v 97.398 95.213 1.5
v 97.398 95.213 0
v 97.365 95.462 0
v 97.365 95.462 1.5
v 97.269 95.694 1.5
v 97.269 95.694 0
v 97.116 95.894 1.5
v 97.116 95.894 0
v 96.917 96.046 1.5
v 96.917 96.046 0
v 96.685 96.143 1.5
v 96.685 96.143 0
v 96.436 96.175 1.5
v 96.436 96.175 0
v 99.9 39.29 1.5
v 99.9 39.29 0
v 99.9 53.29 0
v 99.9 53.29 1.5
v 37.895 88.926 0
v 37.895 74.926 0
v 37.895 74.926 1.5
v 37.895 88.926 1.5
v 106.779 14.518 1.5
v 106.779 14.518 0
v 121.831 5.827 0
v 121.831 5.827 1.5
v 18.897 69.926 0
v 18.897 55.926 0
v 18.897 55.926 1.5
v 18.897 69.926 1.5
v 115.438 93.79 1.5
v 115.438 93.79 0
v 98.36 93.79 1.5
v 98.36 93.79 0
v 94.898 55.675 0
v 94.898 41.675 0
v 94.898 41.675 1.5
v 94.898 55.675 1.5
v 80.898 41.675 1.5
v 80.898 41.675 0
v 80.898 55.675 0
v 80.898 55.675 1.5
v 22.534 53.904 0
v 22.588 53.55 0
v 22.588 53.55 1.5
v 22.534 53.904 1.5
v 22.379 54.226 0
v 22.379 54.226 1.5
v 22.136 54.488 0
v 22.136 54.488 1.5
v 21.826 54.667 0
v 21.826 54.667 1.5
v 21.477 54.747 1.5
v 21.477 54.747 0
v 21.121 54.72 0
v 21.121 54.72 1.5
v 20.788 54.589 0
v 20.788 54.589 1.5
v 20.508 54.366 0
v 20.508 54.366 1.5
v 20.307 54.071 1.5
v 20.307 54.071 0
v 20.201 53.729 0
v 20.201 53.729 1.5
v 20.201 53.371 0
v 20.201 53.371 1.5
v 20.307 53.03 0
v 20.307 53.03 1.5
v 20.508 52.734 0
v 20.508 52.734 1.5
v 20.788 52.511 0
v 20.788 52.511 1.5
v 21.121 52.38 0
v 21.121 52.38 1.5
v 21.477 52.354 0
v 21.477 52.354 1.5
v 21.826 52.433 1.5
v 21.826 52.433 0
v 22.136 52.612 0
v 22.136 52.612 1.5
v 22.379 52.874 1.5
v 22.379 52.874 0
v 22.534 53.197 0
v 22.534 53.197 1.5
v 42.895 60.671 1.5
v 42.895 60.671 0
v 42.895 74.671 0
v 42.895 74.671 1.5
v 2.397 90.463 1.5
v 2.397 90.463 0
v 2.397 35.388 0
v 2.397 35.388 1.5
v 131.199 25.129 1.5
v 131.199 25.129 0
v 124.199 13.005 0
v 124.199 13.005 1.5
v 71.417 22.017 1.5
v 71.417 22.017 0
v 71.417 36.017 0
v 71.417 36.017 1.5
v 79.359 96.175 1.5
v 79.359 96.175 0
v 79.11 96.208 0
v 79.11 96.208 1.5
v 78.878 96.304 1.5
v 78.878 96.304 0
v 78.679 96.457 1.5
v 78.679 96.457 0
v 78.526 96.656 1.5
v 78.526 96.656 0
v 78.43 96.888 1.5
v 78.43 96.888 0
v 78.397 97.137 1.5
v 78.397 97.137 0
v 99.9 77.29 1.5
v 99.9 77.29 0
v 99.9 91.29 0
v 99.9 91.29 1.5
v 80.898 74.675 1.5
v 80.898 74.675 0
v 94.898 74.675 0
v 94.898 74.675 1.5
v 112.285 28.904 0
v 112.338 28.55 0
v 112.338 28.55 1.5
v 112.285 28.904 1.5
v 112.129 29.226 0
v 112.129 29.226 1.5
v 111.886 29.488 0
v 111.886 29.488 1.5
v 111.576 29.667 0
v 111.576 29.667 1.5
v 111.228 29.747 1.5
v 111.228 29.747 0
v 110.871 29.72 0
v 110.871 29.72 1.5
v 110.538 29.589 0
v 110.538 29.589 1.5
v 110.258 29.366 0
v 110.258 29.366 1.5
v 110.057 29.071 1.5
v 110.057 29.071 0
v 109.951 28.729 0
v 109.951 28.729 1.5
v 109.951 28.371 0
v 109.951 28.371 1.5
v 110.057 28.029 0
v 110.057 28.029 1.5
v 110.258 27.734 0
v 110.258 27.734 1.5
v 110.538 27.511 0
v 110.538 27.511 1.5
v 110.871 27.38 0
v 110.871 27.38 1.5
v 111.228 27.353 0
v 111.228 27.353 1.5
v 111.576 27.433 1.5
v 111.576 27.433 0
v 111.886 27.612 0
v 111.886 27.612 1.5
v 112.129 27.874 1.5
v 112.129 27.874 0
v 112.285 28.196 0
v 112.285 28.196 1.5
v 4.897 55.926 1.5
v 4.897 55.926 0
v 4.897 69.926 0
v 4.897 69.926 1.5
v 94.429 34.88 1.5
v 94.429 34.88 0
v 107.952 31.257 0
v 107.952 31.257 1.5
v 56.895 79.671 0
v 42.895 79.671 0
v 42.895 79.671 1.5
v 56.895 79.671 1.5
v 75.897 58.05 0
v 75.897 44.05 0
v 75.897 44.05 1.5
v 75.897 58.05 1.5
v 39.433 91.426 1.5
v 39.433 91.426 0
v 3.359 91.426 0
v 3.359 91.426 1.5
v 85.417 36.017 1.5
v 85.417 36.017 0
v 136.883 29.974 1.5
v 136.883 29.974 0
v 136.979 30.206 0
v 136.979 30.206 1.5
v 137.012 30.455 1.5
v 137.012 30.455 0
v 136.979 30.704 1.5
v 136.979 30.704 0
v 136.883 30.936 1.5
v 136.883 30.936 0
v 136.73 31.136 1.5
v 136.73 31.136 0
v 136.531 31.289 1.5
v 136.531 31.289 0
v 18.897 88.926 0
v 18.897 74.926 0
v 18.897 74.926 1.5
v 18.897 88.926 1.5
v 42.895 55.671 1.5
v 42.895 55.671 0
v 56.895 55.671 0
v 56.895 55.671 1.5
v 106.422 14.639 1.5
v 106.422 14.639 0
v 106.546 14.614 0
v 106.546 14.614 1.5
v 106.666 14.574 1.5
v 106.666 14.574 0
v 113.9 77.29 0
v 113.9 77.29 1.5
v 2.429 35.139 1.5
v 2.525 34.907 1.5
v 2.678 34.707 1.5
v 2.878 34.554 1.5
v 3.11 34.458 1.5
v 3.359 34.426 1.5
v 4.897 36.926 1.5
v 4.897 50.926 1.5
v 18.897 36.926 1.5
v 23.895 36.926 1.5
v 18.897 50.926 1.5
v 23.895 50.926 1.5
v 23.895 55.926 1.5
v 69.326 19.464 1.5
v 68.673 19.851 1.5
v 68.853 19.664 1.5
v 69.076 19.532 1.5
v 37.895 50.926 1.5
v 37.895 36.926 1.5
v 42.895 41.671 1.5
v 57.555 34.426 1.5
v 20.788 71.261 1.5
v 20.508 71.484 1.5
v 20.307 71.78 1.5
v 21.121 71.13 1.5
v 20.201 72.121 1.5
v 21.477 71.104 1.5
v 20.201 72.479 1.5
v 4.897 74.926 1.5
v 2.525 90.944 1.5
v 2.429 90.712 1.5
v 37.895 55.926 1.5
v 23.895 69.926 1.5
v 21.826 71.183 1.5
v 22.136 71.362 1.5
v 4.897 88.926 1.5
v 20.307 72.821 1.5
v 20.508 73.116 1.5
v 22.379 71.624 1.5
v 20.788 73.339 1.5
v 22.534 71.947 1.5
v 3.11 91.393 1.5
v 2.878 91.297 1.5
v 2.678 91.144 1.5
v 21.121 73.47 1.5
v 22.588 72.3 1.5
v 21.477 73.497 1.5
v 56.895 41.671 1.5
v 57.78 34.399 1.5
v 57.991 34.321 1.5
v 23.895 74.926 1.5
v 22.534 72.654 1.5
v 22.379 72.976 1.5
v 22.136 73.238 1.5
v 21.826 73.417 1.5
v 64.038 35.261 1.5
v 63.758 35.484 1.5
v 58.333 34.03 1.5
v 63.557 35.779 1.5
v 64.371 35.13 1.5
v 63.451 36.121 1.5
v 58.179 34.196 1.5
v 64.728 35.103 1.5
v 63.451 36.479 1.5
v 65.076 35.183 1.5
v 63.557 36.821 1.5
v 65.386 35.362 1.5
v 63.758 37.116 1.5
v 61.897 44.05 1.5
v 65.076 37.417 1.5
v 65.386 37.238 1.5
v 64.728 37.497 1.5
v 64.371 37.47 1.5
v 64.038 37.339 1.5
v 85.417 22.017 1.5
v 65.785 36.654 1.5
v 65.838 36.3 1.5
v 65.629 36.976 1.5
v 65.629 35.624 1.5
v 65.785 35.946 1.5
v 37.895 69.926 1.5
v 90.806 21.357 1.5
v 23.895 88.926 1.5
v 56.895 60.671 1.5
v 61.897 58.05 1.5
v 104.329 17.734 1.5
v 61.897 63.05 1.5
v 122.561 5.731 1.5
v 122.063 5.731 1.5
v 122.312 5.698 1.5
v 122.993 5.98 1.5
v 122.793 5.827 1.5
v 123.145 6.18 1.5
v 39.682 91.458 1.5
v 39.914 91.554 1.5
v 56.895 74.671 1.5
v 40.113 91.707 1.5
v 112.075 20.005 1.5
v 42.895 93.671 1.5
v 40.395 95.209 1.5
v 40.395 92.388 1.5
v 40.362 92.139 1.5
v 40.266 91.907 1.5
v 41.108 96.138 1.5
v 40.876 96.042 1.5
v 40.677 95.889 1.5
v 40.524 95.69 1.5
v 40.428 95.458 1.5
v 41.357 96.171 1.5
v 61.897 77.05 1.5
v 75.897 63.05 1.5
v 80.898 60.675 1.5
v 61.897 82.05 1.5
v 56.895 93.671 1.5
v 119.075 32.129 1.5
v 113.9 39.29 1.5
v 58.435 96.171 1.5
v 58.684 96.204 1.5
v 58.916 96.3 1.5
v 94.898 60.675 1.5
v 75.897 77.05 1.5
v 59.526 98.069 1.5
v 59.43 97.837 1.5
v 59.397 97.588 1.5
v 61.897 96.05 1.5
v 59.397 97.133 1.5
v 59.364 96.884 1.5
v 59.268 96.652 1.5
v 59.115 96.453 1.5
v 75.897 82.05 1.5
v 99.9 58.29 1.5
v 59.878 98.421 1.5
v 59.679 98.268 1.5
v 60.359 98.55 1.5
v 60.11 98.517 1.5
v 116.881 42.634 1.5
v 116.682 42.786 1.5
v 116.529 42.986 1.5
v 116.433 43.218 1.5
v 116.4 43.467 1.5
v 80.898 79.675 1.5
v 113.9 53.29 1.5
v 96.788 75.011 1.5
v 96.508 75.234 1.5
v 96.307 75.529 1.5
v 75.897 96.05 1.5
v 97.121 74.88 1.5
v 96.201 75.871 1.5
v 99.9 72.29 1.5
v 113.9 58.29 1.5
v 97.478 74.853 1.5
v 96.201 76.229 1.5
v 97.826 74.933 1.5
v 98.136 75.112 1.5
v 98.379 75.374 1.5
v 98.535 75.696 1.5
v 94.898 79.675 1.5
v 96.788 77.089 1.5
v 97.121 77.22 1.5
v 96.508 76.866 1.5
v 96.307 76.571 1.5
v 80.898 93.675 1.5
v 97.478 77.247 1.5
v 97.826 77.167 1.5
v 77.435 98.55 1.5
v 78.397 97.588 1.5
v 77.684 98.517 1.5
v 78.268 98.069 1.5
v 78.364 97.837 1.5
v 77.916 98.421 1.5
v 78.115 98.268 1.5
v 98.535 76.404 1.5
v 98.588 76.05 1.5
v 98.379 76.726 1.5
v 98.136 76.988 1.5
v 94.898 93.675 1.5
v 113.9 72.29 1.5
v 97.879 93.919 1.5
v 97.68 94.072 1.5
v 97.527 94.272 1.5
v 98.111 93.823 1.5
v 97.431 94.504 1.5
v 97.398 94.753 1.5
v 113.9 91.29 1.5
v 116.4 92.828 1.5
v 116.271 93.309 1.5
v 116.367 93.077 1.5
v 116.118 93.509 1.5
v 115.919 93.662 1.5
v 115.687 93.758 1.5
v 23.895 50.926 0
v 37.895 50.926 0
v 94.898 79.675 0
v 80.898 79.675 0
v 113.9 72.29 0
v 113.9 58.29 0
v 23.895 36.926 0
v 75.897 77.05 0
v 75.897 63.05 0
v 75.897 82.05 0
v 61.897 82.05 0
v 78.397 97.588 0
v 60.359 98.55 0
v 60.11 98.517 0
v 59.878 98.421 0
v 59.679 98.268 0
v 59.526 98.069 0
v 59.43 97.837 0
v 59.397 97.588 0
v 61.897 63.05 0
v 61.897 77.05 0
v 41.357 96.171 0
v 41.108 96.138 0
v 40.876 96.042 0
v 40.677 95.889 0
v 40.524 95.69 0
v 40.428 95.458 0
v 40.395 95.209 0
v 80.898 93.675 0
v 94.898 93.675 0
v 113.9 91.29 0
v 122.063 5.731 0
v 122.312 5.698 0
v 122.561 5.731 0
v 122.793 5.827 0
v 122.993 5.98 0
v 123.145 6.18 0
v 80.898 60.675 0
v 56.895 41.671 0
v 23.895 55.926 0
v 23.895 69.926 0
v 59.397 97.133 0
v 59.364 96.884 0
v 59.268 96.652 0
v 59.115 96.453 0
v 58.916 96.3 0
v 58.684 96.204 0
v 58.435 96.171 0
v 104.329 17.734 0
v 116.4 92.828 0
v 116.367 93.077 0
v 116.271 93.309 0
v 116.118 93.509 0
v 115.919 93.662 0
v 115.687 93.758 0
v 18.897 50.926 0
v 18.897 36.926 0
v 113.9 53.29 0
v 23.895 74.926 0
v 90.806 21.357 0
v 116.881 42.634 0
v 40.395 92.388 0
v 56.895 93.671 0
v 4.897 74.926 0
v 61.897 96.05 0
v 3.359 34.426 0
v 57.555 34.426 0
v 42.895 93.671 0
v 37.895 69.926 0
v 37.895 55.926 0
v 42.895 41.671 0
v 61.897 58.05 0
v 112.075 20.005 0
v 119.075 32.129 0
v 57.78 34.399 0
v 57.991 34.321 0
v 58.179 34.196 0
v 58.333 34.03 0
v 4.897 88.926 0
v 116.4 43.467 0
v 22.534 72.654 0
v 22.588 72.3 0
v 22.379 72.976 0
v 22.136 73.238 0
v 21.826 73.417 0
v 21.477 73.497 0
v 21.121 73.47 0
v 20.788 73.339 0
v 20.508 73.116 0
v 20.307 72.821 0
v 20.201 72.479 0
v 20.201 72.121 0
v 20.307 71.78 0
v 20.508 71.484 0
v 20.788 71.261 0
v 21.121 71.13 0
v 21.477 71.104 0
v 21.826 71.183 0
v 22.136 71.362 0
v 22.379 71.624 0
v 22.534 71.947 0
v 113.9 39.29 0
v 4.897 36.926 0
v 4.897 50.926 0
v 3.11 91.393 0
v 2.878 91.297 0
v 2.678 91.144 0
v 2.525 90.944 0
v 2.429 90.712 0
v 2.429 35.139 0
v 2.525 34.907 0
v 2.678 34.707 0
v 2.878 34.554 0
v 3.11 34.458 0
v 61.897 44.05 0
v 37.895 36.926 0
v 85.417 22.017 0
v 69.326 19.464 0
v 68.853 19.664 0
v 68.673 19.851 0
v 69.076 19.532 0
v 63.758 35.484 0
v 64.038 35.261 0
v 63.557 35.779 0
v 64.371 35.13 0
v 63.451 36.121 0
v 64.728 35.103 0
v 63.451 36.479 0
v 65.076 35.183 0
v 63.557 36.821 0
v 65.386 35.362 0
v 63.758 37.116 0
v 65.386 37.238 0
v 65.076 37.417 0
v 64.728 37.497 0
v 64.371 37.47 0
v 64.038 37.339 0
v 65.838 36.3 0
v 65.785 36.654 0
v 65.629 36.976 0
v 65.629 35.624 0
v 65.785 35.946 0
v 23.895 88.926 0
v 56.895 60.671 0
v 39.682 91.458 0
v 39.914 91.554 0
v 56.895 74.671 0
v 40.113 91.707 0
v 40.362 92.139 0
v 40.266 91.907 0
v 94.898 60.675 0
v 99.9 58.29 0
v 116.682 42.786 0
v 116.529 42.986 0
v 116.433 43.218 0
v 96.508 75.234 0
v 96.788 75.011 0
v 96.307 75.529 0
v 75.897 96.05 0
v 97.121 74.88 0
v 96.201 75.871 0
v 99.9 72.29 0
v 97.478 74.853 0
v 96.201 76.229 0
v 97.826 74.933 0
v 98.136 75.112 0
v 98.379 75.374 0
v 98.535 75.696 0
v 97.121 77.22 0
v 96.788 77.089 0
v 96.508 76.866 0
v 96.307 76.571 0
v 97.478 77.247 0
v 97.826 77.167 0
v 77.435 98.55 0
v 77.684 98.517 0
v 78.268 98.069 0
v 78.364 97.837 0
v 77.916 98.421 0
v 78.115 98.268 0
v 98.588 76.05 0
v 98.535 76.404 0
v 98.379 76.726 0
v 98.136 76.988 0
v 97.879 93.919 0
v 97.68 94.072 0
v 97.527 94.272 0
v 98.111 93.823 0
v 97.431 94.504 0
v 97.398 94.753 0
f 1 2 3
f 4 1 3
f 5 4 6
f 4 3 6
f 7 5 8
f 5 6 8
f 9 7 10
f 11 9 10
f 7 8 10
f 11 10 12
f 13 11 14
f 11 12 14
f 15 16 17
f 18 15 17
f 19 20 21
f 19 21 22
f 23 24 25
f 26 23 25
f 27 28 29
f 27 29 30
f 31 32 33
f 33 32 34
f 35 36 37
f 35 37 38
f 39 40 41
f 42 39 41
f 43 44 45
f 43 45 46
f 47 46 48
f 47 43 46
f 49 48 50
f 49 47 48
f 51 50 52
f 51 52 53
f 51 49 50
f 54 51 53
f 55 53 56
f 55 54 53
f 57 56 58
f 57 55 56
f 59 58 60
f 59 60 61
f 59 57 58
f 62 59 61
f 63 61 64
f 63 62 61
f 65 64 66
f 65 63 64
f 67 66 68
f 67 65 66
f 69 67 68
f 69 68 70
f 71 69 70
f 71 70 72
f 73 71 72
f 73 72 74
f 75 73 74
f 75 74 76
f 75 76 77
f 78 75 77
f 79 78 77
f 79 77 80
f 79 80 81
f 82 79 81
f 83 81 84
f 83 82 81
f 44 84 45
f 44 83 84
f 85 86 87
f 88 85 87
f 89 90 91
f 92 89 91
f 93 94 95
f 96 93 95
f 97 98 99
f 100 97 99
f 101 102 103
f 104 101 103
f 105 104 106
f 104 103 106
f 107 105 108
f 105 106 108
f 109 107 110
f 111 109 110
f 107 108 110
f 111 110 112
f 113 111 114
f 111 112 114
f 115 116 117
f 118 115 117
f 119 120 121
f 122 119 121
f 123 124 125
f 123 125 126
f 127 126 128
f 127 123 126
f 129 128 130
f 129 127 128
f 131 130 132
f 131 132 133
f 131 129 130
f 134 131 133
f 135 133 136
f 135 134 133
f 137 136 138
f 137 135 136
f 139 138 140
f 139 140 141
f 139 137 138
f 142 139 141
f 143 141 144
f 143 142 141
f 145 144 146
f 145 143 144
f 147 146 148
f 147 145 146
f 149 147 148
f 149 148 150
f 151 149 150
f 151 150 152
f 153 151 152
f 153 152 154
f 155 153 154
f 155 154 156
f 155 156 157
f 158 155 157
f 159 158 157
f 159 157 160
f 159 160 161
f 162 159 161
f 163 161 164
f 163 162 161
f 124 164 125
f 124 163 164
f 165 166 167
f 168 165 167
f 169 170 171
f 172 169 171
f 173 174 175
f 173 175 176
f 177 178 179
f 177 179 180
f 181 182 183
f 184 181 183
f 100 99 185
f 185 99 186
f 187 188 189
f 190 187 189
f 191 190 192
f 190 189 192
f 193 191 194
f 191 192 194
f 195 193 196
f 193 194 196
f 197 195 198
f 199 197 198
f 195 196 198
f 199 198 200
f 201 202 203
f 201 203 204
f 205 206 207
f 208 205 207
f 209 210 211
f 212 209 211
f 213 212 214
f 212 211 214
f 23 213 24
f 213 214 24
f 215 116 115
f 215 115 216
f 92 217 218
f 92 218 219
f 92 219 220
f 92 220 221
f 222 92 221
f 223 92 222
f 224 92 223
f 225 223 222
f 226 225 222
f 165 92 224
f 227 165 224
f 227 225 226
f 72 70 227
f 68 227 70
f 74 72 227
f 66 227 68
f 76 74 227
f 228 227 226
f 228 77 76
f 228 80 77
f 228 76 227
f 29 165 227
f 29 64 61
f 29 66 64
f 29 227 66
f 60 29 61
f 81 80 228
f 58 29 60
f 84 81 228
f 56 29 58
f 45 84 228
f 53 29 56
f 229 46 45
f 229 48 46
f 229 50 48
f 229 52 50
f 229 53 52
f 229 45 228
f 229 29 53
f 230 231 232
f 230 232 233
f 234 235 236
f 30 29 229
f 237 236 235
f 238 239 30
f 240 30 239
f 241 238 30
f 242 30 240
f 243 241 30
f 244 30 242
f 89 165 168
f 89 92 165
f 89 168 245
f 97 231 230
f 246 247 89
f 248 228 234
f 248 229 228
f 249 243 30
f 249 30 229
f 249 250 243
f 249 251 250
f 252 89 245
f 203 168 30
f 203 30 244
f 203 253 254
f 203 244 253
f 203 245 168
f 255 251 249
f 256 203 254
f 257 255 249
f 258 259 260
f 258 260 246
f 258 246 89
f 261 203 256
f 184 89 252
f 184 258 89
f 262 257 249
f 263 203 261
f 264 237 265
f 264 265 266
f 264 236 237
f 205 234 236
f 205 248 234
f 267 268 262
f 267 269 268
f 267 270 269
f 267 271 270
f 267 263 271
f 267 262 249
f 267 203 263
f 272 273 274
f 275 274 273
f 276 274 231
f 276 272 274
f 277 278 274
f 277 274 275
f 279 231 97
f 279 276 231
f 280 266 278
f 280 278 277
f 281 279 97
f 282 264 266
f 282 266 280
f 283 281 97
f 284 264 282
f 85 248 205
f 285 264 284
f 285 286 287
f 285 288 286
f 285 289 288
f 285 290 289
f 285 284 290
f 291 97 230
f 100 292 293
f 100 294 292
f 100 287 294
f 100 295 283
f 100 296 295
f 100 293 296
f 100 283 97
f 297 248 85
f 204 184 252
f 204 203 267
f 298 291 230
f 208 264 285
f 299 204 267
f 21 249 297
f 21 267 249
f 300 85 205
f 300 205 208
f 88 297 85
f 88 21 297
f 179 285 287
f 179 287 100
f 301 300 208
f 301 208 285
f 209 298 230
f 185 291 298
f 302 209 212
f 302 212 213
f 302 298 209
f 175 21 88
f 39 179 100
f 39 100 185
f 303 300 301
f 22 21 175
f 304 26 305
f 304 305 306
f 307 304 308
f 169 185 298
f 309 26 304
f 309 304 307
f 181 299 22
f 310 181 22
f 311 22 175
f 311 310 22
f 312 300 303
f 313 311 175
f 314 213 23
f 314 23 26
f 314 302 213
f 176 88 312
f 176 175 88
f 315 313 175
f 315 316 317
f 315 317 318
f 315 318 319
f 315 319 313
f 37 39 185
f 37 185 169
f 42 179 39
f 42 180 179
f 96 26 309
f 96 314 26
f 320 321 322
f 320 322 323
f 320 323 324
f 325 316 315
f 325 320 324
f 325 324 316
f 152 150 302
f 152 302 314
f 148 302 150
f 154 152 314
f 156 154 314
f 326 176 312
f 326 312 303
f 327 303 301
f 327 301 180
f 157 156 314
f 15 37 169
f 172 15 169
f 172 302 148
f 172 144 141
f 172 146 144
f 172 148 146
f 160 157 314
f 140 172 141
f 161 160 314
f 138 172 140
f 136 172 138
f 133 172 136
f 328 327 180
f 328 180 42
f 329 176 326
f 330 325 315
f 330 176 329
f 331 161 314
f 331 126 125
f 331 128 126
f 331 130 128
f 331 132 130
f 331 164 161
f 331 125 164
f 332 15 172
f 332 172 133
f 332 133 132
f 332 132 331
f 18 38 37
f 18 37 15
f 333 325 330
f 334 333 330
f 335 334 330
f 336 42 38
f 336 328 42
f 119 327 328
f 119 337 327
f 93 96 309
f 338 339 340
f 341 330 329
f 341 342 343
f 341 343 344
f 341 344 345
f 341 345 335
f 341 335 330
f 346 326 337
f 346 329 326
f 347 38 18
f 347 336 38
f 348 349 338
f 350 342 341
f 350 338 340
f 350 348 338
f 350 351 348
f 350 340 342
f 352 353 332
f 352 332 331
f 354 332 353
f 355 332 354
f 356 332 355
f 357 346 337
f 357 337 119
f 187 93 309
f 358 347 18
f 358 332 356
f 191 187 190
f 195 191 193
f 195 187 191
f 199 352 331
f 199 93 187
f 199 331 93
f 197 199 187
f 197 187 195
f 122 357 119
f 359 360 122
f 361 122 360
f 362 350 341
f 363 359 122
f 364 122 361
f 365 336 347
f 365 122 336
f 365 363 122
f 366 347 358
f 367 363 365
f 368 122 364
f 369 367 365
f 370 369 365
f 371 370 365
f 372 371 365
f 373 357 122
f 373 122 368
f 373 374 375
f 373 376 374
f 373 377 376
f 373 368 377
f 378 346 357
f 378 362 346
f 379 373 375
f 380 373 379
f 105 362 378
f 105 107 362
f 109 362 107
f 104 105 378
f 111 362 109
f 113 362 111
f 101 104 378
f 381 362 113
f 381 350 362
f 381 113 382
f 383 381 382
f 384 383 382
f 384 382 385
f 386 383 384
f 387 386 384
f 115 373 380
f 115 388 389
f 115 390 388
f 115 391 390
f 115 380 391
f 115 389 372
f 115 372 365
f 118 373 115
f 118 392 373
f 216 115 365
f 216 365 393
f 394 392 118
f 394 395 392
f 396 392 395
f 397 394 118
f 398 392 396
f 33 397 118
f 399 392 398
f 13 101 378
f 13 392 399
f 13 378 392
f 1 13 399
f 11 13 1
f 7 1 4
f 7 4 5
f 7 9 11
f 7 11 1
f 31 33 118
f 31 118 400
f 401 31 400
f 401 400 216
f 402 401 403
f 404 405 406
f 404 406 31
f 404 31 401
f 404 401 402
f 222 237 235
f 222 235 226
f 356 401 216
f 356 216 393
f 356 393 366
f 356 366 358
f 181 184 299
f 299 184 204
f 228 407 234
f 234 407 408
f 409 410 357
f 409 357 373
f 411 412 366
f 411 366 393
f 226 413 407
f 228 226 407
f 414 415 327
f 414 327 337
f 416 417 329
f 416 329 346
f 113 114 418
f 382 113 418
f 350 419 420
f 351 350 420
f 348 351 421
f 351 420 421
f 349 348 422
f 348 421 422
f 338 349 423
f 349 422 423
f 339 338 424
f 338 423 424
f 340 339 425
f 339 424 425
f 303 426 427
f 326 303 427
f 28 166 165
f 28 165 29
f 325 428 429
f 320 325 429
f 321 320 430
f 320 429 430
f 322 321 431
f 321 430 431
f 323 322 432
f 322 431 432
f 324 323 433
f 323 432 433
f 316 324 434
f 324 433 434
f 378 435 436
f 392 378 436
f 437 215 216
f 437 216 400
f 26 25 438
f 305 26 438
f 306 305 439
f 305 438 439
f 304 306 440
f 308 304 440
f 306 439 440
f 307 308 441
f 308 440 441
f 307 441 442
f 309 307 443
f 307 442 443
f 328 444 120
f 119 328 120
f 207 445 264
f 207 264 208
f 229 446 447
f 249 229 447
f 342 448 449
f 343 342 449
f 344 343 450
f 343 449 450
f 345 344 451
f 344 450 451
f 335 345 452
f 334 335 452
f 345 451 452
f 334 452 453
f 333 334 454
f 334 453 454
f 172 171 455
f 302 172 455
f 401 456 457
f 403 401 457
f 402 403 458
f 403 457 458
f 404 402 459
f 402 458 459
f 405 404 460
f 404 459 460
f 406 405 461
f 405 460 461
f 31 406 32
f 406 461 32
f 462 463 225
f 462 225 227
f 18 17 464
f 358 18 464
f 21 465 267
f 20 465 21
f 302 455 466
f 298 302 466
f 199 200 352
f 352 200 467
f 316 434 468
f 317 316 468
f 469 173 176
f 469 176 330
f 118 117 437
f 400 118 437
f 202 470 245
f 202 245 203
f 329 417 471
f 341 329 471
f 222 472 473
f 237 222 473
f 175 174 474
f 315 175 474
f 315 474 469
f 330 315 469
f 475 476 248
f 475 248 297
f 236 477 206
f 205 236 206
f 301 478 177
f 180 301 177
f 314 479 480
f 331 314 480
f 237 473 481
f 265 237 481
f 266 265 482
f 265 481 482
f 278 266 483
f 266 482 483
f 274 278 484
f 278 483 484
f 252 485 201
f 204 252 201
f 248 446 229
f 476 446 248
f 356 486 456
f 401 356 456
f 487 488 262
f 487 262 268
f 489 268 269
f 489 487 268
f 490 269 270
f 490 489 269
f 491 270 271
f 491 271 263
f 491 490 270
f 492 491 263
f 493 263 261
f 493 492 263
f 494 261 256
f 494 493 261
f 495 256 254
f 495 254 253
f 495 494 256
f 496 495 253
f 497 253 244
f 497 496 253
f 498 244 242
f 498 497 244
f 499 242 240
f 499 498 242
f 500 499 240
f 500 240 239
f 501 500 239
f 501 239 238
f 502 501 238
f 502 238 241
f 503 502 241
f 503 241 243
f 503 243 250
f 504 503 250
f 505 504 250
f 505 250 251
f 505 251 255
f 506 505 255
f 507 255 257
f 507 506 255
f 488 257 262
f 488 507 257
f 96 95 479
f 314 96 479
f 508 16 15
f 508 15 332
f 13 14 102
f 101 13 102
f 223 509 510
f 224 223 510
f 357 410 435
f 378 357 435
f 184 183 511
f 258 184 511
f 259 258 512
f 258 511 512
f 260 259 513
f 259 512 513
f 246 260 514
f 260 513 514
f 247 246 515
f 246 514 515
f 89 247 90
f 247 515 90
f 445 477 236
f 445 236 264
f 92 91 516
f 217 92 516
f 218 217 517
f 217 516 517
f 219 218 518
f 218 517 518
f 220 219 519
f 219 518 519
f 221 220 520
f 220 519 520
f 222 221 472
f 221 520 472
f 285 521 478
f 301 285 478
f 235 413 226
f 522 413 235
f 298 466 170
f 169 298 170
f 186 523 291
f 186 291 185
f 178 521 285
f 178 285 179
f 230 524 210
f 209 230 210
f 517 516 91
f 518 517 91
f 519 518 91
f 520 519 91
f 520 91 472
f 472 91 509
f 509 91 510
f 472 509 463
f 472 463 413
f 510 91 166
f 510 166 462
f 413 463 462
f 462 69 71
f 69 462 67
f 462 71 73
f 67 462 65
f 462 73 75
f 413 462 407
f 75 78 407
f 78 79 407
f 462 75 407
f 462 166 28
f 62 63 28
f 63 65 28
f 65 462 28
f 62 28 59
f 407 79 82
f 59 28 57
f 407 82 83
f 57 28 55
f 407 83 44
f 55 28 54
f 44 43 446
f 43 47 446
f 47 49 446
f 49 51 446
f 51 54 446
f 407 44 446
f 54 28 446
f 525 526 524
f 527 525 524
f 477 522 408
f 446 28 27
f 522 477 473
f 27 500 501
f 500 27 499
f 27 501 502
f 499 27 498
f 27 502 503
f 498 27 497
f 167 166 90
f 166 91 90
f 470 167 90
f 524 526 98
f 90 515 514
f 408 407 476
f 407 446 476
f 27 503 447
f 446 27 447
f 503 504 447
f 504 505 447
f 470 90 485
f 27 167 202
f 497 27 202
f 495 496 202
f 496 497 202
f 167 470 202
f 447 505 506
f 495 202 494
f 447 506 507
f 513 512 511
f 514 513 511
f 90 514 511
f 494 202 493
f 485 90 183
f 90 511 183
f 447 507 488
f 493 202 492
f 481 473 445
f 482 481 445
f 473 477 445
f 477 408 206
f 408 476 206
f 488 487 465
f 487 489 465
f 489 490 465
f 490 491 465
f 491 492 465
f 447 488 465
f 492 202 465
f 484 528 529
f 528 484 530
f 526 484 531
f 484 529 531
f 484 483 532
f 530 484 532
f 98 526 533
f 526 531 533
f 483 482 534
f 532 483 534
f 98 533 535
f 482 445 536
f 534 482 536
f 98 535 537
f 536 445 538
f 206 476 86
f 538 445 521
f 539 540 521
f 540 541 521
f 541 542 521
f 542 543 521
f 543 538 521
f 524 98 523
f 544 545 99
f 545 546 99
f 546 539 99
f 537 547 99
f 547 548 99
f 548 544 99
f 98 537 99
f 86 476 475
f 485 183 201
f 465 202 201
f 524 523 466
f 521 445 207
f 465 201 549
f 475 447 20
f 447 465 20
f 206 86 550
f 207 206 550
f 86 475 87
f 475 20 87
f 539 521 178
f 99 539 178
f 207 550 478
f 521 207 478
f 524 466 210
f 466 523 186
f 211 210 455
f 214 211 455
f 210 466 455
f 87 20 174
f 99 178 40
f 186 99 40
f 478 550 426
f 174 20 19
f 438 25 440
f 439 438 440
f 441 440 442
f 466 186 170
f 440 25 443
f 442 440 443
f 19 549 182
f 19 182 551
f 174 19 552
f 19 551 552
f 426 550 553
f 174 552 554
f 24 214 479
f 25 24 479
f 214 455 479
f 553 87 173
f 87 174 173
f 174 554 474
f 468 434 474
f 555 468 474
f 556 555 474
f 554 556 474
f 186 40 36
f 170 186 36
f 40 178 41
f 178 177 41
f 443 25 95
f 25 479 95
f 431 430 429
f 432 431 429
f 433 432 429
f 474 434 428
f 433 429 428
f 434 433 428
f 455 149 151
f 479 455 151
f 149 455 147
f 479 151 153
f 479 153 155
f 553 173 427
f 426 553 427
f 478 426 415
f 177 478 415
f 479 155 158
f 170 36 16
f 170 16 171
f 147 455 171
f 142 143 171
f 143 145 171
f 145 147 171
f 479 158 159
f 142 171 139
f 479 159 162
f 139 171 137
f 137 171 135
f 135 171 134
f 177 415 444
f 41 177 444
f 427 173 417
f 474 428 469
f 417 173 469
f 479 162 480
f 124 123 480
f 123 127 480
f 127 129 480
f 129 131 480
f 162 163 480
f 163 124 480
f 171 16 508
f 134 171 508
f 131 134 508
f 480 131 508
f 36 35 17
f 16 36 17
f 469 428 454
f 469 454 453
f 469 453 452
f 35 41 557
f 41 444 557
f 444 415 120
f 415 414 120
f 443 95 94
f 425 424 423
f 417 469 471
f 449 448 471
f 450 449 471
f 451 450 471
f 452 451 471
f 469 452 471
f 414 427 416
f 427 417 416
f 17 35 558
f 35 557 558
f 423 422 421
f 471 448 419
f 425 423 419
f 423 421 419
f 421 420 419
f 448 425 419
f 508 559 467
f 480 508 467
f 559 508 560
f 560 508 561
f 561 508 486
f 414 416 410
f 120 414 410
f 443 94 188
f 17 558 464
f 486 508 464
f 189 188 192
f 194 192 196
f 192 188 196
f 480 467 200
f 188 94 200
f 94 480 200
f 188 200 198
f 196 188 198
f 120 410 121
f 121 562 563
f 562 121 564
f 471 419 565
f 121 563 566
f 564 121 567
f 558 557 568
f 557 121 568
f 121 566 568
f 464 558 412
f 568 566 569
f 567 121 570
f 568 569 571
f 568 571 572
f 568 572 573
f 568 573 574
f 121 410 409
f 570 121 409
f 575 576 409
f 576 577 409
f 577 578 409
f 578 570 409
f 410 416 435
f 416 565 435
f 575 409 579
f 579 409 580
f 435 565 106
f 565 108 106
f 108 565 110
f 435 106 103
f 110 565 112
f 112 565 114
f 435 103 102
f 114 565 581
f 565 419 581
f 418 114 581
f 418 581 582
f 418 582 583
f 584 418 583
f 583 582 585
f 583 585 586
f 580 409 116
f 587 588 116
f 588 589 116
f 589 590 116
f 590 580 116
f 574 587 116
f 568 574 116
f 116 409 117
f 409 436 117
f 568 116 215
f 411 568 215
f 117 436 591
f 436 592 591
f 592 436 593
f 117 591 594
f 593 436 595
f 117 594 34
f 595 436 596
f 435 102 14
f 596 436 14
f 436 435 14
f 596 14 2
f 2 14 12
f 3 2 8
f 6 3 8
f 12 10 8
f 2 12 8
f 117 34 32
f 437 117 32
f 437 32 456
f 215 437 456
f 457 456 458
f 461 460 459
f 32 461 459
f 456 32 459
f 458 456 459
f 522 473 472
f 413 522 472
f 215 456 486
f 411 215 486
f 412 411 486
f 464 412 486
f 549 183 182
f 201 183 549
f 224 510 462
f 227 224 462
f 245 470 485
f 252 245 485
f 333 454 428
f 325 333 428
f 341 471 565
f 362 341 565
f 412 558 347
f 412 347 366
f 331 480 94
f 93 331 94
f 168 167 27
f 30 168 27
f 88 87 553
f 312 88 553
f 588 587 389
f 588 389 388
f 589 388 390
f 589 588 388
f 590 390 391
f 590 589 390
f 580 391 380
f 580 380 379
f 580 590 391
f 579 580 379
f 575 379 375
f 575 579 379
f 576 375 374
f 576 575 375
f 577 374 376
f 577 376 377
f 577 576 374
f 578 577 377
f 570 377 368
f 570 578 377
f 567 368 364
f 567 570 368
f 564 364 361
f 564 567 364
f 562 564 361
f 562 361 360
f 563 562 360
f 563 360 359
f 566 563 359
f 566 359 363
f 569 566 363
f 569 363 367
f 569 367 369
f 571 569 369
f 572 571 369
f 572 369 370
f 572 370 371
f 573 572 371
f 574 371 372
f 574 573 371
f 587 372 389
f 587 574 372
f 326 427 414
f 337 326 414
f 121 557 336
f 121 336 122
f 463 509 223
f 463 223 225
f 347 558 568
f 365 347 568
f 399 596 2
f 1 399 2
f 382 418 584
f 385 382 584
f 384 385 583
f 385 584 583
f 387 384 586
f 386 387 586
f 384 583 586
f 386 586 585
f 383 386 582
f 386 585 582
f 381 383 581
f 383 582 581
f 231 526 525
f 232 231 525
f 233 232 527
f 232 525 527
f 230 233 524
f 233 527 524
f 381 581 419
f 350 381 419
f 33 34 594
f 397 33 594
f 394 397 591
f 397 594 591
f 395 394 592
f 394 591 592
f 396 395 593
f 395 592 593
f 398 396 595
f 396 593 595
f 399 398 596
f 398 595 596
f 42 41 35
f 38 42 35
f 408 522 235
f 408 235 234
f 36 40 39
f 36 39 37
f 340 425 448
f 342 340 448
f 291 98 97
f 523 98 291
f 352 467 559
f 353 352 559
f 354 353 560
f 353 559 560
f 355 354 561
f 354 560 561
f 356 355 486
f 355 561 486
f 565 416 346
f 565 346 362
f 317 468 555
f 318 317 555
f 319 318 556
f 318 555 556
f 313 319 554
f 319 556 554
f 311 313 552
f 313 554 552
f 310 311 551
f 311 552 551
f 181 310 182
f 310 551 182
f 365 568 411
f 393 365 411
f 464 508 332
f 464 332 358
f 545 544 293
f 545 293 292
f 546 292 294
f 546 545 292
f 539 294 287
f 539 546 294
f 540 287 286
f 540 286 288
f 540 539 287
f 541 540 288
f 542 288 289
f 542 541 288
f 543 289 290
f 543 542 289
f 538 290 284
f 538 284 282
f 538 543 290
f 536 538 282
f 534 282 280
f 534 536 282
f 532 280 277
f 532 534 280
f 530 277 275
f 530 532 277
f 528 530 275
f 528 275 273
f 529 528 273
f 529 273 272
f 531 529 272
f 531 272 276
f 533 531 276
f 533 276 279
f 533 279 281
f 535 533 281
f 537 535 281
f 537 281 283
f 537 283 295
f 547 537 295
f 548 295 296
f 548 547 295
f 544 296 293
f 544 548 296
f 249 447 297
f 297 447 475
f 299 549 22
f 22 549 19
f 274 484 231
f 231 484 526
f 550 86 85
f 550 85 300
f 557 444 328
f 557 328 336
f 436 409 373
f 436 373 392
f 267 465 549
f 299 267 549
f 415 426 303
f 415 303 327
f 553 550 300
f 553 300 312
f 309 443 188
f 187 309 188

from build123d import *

# Parameters (mm, degrees)
SKETCH2_W           = 13.999999997
SKETCH2_H           = 13.999999996
SKETCH2_W_2         = 13.999999996
SKETCH2_R           = 1.2
SKETCH2_H_2         = 13.999999997
BOSS_EXTRUDE1_DEPTH = 1.5


with BuildPart() as part:
    # Sketch2 → Boss-Extrude1 (new body)
    with BuildSketch(Plane.XY):
        with BuildLine():
            ThreePointArc((3.358715952, 91.42556159), (2.678391323, 91.143761902), (2.396591635, 90.463437274))
            Line((2.396591635, 90.463437274), (2.396591635, 35.387693174))
            ThreePointArc((2.396591635, 35.387693174), (2.678391323, 34.707368546), (3.358715952, 34.425568858))
            Line((3.358715952, 34.425568858), (57.55538108, 34.425568858))
            ThreePointArc((57.55538108, 34.425568858), (57.991412266, 34.32109249), (58.332746845, 34.030353412))
            Line((58.332746845, 34.030353412), (68.6731028, 19.851286658))
            ThreePointArc((68.6731028, 19.851286658), (68.959916761, 19.590522811), (69.326358752, 19.464109602))
            Line((69.326358752, 19.464109602), (106.42211034, 14.638604201))
            ThreePointArc((106.42211034, 14.638604201), (106.606561986, 14.595821202), (106.779062685, 14.517742374))
            Line((106.779062685, 14.517742374), (121.831200494, 5.827386558))
            ThreePointArc((121.831200494, 5.827386558), (122.561278749, 5.731269932), (123.145486752, 6.1795485))
            Line((123.145486752, 6.1795485), (136.883362434, 29.974247168))
            ThreePointArc((136.883362434, 29.974247168), (136.979479059, 30.704325424), (136.531200492, 31.288533426))
            Line((136.531200492, 31.288533426), (116.881014221, 42.63357376))
            ThreePointArc((116.881014221, 42.63357376), (116.52885228, 42.985735701), (116.399952063, 43.466797859))
            Line((116.399952063, 43.466797859), (116.399952063, 92.828345033))
            ThreePointArc((116.399952063, 92.828345033), (116.118152375, 93.508669661), (115.437827746, 93.790469349))
            Line((115.437827746, 93.790469349), (98.360317754, 93.790469349))
            ThreePointArc((98.360317754, 93.790469349), (97.679993126, 94.072269037), (97.398193438, 94.752593666))
            Line((97.398193438, 94.752593666), (97.398193438, 95.213192117))
            ThreePointArc((97.398193438, 95.213192117), (97.11639375, 95.893516746), (96.436069121, 96.175316434))
            Line((96.436069121, 96.175316434), (79.359092742, 96.175316434))
            ThreePointArc((79.359092742, 96.175316434), (78.678768113, 96.457116122), (78.396968425, 97.137440751))
            Line((78.396968425, 97.137440751), (78.396968425, 97.587767164))
            ThreePointArc((78.396968425, 97.587767164), (78.115168737, 98.268091793), (77.434844109, 98.54989148))
            Line((77.434844109, 98.54989148), (60.359092745, 98.54989148))
            ThreePointArc((60.359092745, 98.54989148), (59.678768117, 98.268091793), (59.396968429, 97.587767164))
            Line((59.396968429, 97.587767164), (59.396968429, 97.133171852))
            ThreePointArc((59.396968429, 97.133171852), (59.115168741, 96.452847223), (58.434844112, 96.171047535))
            Line((58.434844112, 96.171047535), (41.357156249, 96.171047535))
            ThreePointArc((41.357156249, 96.171047535), (40.676831621, 95.889247847), (40.395031933, 95.208923218))
            Line((40.395031933, 95.208923218), (40.395031933, 92.387685907))
            ThreePointArc((40.395031933, 92.387685907), (40.113232245, 91.707361278), (39.432907616, 91.42556159))
            Line((39.432907616, 91.42556159), (3.358715952, 91.42556159))
        make_face()
        with Locations((11.896591633, 43.925568856)):
            Rectangle(SKETCH2_W, SKETCH2_H, mode=Mode.SUBTRACT)
        with Locations((30.894762974, 43.926240308)):
            Rectangle(SKETCH2_W_2, SKETCH2_H, mode=Mode.SUBTRACT)
        with Locations((64.637863533, 36.300090173)):
            Circle(SKETCH2_R, mode=Mode.SUBTRACT)
        with Locations((49.895031931, 48.671054801)):
            Rectangle(SKETCH2_W_2, SKETCH2_H_2, mode=Mode.SUBTRACT)
        with Locations((68.896968427, 51.049898746)):
            Rectangle(SKETCH2_W_2, SKETCH2_H, mode=Mode.SUBTRACT)
        Polygon((94.429437772, 34.880450616), (107.952399337, 31.256983985), (104.328932707, 17.734022421), (90.805971142, 21.357489051), align=None, mode=Mode.SUBTRACT)
        with Locations((111.137845658, 28.550051811)):
            Circle(SKETCH2_R, mode=Mode.SUBTRACT)
        Polygon((124.199361084, 13.004912388), (112.075005434, 20.004912386), (119.075005433, 32.129268036), (131.199361083, 25.129268038), align=None, mode=Mode.SUBTRACT)
        with Locations((78.416585941, 29.017413842)):
            Rectangle(SKETCH2_W_2, SKETCH2_H, mode=Mode.SUBTRACT)
        with Locations((87.89819344, 48.6753237)):
            Rectangle(SKETCH2_W, SKETCH2_H_2, mode=Mode.SUBTRACT)
        with Locations((106.899952065, 46.290476615)):
            Rectangle(SKETCH2_W, SKETCH2_H_2, mode=Mode.SUBTRACT)
        with Locations((11.896591633, 62.925568851)):
            Rectangle(SKETCH2_W, SKETCH2_H, mode=Mode.SUBTRACT)
        with Locations((21.387798276, 53.550235091)):
            Circle(SKETCH2_R, mode=Mode.SUBTRACT)
        with Locations((30.894762974, 62.926240303)):
            Rectangle(SKETCH2_W_2, SKETCH2_H, mode=Mode.SUBTRACT)
        with Locations((21.387798276, 72.300241098)):
            Circle(SKETCH2_R, mode=Mode.SUBTRACT)
        with Locations((49.895031931, 67.671054795)):
            Rectangle(SKETCH2_W_2, SKETCH2_H_2, mode=Mode.SUBTRACT)
        with Locations((68.896968427, 70.049898741)):
            Rectangle(SKETCH2_W_2, SKETCH2_H, mode=Mode.SUBTRACT)
        with Locations((11.896591633, 81.925561592)):
            Rectangle(SKETCH2_W, SKETCH2_H, mode=Mode.SUBTRACT)
        with Locations((30.894762974, 81.926233044)):
            Rectangle(SKETCH2_W_2, SKETCH2_H, mode=Mode.SUBTRACT)
        with Locations((49.895031931, 86.671047537)):
            Rectangle(SKETCH2_W_2, SKETCH2_H, mode=Mode.SUBTRACT)
        with Locations((68.896968427, 89.049891482)):
            Rectangle(SKETCH2_W_2, SKETCH2_H, mode=Mode.SUBTRACT)
        with Locations((87.89819344, 67.675323695)):
            Rectangle(SKETCH2_W, SKETCH2_H_2, mode=Mode.SUBTRACT)
        with Locations((106.899952065, 65.29047661)):
            Rectangle(SKETCH2_W, SKETCH2_H, mode=Mode.SUBTRACT)
        with Locations((97.387827206, 76.050038887)):
            Circle(SKETCH2_R, mode=Mode.SUBTRACT)
        with Locations((87.89819344, 86.675316436)):
            Rectangle(SKETCH2_W, SKETCH2_H_2, mode=Mode.SUBTRACT)
        with Locations((106.899952065, 84.290469351)):
            Rectangle(SKETCH2_W, SKETCH2_H, mode=Mode.SUBTRACT)
    extrude(amount=BOSS_EXTRUDE1_DEPTH)


solid = part.part
